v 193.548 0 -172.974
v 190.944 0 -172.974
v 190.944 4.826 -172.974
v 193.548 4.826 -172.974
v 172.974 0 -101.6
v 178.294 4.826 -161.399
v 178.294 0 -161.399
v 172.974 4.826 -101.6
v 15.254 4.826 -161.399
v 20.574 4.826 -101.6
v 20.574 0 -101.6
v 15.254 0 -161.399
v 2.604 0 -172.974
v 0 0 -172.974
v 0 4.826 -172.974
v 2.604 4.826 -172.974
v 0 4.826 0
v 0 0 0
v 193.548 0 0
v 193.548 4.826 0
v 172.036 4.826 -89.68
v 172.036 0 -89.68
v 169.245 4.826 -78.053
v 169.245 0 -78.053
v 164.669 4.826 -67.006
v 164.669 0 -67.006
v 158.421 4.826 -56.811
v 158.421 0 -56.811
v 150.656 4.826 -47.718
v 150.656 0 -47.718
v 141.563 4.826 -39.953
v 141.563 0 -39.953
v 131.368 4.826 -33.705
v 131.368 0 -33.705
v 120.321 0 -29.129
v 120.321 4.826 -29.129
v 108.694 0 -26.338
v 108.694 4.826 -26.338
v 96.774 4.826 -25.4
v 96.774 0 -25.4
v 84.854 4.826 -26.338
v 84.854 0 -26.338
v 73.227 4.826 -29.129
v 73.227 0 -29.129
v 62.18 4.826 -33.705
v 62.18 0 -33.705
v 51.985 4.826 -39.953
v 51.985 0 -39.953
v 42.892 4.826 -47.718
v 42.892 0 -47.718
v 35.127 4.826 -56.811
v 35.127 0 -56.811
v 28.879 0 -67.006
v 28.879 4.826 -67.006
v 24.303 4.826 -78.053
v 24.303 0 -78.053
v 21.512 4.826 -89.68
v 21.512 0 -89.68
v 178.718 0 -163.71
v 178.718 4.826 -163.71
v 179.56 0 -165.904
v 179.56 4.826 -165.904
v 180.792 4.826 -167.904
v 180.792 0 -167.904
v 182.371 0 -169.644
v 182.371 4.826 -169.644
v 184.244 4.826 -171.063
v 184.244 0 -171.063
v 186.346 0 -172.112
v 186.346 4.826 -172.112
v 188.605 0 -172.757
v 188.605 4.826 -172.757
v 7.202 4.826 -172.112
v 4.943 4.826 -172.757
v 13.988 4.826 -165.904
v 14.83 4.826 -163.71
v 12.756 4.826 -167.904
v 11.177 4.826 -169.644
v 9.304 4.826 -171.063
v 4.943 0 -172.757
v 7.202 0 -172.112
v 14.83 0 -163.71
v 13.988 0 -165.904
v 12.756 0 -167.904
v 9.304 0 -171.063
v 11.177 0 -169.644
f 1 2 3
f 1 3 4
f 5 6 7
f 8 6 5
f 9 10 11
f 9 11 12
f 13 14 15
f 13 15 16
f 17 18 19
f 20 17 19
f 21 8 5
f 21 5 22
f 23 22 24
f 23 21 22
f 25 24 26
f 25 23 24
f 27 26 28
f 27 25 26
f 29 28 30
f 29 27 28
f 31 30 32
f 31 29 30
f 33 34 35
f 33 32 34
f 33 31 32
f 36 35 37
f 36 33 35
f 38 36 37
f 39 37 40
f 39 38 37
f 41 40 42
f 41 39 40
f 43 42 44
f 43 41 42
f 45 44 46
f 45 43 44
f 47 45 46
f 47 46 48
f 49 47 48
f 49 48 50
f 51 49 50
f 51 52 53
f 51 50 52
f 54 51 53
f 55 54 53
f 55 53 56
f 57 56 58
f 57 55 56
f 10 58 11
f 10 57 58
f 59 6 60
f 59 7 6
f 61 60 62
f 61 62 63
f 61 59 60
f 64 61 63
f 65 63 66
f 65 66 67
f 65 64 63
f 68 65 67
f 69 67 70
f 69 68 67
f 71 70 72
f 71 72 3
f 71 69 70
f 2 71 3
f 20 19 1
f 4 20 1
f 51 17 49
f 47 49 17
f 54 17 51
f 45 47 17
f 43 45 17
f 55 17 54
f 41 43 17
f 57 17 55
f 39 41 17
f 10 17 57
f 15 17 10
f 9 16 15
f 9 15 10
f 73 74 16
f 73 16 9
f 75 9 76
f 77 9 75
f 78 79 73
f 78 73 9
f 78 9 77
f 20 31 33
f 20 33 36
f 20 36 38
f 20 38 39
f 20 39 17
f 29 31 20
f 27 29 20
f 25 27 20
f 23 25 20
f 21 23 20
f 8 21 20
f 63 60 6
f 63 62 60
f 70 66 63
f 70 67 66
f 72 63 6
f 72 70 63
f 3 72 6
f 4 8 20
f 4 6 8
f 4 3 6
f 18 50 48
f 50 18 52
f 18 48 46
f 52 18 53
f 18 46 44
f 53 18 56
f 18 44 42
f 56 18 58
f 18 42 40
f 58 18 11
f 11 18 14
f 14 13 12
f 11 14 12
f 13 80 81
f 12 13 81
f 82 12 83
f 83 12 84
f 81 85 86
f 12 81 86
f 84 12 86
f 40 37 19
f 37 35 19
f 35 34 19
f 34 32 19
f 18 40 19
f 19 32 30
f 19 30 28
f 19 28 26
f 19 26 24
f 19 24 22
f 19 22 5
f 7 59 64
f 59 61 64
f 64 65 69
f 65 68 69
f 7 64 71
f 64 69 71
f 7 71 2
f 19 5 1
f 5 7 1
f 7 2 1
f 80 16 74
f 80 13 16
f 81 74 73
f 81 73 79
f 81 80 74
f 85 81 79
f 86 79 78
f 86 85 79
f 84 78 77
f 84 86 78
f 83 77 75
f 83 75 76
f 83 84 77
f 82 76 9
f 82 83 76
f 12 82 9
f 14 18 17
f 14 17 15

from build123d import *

# Parameters (mm, degrees)
SKETCH1_W             = 193.548
SKETCH1_H             = 172.974
BASE_DEPTH            = 4.826
CENTER_CUT_DEPTH      = 260.623040688
LEADING_EDGE_FILLET_R = 12.7


with BuildPart() as part:
    # Sketch1 → Base (new body)
    with BuildSketch(Plane(origin=(0, 0, 0), x_dir=(1, 0, 0), z_dir=(0, 1, 0))):
        with Locations((96.774, 86.487)):
            Rectangle(SKETCH1_W, SKETCH1_H)
    extrude(amount=BASE_DEPTH)

    # Sketch2 → Center Cut (cut, through all)
    with BuildSketch(Plane(origin=(0, 4.826, 0), x_dir=(1, 0, 0), z_dir=(0, 1, 0))):
        with BuildLine():
            Line((20.574, 101.6), (14.224, 172.974))
            Line((14.224, 172.974), (179.324, 172.974))
            Line((179.324, 172.974), (172.974, 101.6))
            ThreePointArc((172.974, 101.6), (96.774, 25.4), (20.574, 101.6))
        make_face()
    extrude(amount=-CENTER_CUT_DEPTH, mode=Mode.SUBTRACT)

    # Leading Edge Fillet
    leading_edge_fillet_edges = [part.edges().sort_by_distance(p)[0] for p in [
        (14.224, 2.413, -172.974),
        (179.324, 2.413, -172.974),
    ]]
    fillet(leading_edge_fillet_edges, radius=LEADING_EDGE_FILLET_R)


solid = part.part
